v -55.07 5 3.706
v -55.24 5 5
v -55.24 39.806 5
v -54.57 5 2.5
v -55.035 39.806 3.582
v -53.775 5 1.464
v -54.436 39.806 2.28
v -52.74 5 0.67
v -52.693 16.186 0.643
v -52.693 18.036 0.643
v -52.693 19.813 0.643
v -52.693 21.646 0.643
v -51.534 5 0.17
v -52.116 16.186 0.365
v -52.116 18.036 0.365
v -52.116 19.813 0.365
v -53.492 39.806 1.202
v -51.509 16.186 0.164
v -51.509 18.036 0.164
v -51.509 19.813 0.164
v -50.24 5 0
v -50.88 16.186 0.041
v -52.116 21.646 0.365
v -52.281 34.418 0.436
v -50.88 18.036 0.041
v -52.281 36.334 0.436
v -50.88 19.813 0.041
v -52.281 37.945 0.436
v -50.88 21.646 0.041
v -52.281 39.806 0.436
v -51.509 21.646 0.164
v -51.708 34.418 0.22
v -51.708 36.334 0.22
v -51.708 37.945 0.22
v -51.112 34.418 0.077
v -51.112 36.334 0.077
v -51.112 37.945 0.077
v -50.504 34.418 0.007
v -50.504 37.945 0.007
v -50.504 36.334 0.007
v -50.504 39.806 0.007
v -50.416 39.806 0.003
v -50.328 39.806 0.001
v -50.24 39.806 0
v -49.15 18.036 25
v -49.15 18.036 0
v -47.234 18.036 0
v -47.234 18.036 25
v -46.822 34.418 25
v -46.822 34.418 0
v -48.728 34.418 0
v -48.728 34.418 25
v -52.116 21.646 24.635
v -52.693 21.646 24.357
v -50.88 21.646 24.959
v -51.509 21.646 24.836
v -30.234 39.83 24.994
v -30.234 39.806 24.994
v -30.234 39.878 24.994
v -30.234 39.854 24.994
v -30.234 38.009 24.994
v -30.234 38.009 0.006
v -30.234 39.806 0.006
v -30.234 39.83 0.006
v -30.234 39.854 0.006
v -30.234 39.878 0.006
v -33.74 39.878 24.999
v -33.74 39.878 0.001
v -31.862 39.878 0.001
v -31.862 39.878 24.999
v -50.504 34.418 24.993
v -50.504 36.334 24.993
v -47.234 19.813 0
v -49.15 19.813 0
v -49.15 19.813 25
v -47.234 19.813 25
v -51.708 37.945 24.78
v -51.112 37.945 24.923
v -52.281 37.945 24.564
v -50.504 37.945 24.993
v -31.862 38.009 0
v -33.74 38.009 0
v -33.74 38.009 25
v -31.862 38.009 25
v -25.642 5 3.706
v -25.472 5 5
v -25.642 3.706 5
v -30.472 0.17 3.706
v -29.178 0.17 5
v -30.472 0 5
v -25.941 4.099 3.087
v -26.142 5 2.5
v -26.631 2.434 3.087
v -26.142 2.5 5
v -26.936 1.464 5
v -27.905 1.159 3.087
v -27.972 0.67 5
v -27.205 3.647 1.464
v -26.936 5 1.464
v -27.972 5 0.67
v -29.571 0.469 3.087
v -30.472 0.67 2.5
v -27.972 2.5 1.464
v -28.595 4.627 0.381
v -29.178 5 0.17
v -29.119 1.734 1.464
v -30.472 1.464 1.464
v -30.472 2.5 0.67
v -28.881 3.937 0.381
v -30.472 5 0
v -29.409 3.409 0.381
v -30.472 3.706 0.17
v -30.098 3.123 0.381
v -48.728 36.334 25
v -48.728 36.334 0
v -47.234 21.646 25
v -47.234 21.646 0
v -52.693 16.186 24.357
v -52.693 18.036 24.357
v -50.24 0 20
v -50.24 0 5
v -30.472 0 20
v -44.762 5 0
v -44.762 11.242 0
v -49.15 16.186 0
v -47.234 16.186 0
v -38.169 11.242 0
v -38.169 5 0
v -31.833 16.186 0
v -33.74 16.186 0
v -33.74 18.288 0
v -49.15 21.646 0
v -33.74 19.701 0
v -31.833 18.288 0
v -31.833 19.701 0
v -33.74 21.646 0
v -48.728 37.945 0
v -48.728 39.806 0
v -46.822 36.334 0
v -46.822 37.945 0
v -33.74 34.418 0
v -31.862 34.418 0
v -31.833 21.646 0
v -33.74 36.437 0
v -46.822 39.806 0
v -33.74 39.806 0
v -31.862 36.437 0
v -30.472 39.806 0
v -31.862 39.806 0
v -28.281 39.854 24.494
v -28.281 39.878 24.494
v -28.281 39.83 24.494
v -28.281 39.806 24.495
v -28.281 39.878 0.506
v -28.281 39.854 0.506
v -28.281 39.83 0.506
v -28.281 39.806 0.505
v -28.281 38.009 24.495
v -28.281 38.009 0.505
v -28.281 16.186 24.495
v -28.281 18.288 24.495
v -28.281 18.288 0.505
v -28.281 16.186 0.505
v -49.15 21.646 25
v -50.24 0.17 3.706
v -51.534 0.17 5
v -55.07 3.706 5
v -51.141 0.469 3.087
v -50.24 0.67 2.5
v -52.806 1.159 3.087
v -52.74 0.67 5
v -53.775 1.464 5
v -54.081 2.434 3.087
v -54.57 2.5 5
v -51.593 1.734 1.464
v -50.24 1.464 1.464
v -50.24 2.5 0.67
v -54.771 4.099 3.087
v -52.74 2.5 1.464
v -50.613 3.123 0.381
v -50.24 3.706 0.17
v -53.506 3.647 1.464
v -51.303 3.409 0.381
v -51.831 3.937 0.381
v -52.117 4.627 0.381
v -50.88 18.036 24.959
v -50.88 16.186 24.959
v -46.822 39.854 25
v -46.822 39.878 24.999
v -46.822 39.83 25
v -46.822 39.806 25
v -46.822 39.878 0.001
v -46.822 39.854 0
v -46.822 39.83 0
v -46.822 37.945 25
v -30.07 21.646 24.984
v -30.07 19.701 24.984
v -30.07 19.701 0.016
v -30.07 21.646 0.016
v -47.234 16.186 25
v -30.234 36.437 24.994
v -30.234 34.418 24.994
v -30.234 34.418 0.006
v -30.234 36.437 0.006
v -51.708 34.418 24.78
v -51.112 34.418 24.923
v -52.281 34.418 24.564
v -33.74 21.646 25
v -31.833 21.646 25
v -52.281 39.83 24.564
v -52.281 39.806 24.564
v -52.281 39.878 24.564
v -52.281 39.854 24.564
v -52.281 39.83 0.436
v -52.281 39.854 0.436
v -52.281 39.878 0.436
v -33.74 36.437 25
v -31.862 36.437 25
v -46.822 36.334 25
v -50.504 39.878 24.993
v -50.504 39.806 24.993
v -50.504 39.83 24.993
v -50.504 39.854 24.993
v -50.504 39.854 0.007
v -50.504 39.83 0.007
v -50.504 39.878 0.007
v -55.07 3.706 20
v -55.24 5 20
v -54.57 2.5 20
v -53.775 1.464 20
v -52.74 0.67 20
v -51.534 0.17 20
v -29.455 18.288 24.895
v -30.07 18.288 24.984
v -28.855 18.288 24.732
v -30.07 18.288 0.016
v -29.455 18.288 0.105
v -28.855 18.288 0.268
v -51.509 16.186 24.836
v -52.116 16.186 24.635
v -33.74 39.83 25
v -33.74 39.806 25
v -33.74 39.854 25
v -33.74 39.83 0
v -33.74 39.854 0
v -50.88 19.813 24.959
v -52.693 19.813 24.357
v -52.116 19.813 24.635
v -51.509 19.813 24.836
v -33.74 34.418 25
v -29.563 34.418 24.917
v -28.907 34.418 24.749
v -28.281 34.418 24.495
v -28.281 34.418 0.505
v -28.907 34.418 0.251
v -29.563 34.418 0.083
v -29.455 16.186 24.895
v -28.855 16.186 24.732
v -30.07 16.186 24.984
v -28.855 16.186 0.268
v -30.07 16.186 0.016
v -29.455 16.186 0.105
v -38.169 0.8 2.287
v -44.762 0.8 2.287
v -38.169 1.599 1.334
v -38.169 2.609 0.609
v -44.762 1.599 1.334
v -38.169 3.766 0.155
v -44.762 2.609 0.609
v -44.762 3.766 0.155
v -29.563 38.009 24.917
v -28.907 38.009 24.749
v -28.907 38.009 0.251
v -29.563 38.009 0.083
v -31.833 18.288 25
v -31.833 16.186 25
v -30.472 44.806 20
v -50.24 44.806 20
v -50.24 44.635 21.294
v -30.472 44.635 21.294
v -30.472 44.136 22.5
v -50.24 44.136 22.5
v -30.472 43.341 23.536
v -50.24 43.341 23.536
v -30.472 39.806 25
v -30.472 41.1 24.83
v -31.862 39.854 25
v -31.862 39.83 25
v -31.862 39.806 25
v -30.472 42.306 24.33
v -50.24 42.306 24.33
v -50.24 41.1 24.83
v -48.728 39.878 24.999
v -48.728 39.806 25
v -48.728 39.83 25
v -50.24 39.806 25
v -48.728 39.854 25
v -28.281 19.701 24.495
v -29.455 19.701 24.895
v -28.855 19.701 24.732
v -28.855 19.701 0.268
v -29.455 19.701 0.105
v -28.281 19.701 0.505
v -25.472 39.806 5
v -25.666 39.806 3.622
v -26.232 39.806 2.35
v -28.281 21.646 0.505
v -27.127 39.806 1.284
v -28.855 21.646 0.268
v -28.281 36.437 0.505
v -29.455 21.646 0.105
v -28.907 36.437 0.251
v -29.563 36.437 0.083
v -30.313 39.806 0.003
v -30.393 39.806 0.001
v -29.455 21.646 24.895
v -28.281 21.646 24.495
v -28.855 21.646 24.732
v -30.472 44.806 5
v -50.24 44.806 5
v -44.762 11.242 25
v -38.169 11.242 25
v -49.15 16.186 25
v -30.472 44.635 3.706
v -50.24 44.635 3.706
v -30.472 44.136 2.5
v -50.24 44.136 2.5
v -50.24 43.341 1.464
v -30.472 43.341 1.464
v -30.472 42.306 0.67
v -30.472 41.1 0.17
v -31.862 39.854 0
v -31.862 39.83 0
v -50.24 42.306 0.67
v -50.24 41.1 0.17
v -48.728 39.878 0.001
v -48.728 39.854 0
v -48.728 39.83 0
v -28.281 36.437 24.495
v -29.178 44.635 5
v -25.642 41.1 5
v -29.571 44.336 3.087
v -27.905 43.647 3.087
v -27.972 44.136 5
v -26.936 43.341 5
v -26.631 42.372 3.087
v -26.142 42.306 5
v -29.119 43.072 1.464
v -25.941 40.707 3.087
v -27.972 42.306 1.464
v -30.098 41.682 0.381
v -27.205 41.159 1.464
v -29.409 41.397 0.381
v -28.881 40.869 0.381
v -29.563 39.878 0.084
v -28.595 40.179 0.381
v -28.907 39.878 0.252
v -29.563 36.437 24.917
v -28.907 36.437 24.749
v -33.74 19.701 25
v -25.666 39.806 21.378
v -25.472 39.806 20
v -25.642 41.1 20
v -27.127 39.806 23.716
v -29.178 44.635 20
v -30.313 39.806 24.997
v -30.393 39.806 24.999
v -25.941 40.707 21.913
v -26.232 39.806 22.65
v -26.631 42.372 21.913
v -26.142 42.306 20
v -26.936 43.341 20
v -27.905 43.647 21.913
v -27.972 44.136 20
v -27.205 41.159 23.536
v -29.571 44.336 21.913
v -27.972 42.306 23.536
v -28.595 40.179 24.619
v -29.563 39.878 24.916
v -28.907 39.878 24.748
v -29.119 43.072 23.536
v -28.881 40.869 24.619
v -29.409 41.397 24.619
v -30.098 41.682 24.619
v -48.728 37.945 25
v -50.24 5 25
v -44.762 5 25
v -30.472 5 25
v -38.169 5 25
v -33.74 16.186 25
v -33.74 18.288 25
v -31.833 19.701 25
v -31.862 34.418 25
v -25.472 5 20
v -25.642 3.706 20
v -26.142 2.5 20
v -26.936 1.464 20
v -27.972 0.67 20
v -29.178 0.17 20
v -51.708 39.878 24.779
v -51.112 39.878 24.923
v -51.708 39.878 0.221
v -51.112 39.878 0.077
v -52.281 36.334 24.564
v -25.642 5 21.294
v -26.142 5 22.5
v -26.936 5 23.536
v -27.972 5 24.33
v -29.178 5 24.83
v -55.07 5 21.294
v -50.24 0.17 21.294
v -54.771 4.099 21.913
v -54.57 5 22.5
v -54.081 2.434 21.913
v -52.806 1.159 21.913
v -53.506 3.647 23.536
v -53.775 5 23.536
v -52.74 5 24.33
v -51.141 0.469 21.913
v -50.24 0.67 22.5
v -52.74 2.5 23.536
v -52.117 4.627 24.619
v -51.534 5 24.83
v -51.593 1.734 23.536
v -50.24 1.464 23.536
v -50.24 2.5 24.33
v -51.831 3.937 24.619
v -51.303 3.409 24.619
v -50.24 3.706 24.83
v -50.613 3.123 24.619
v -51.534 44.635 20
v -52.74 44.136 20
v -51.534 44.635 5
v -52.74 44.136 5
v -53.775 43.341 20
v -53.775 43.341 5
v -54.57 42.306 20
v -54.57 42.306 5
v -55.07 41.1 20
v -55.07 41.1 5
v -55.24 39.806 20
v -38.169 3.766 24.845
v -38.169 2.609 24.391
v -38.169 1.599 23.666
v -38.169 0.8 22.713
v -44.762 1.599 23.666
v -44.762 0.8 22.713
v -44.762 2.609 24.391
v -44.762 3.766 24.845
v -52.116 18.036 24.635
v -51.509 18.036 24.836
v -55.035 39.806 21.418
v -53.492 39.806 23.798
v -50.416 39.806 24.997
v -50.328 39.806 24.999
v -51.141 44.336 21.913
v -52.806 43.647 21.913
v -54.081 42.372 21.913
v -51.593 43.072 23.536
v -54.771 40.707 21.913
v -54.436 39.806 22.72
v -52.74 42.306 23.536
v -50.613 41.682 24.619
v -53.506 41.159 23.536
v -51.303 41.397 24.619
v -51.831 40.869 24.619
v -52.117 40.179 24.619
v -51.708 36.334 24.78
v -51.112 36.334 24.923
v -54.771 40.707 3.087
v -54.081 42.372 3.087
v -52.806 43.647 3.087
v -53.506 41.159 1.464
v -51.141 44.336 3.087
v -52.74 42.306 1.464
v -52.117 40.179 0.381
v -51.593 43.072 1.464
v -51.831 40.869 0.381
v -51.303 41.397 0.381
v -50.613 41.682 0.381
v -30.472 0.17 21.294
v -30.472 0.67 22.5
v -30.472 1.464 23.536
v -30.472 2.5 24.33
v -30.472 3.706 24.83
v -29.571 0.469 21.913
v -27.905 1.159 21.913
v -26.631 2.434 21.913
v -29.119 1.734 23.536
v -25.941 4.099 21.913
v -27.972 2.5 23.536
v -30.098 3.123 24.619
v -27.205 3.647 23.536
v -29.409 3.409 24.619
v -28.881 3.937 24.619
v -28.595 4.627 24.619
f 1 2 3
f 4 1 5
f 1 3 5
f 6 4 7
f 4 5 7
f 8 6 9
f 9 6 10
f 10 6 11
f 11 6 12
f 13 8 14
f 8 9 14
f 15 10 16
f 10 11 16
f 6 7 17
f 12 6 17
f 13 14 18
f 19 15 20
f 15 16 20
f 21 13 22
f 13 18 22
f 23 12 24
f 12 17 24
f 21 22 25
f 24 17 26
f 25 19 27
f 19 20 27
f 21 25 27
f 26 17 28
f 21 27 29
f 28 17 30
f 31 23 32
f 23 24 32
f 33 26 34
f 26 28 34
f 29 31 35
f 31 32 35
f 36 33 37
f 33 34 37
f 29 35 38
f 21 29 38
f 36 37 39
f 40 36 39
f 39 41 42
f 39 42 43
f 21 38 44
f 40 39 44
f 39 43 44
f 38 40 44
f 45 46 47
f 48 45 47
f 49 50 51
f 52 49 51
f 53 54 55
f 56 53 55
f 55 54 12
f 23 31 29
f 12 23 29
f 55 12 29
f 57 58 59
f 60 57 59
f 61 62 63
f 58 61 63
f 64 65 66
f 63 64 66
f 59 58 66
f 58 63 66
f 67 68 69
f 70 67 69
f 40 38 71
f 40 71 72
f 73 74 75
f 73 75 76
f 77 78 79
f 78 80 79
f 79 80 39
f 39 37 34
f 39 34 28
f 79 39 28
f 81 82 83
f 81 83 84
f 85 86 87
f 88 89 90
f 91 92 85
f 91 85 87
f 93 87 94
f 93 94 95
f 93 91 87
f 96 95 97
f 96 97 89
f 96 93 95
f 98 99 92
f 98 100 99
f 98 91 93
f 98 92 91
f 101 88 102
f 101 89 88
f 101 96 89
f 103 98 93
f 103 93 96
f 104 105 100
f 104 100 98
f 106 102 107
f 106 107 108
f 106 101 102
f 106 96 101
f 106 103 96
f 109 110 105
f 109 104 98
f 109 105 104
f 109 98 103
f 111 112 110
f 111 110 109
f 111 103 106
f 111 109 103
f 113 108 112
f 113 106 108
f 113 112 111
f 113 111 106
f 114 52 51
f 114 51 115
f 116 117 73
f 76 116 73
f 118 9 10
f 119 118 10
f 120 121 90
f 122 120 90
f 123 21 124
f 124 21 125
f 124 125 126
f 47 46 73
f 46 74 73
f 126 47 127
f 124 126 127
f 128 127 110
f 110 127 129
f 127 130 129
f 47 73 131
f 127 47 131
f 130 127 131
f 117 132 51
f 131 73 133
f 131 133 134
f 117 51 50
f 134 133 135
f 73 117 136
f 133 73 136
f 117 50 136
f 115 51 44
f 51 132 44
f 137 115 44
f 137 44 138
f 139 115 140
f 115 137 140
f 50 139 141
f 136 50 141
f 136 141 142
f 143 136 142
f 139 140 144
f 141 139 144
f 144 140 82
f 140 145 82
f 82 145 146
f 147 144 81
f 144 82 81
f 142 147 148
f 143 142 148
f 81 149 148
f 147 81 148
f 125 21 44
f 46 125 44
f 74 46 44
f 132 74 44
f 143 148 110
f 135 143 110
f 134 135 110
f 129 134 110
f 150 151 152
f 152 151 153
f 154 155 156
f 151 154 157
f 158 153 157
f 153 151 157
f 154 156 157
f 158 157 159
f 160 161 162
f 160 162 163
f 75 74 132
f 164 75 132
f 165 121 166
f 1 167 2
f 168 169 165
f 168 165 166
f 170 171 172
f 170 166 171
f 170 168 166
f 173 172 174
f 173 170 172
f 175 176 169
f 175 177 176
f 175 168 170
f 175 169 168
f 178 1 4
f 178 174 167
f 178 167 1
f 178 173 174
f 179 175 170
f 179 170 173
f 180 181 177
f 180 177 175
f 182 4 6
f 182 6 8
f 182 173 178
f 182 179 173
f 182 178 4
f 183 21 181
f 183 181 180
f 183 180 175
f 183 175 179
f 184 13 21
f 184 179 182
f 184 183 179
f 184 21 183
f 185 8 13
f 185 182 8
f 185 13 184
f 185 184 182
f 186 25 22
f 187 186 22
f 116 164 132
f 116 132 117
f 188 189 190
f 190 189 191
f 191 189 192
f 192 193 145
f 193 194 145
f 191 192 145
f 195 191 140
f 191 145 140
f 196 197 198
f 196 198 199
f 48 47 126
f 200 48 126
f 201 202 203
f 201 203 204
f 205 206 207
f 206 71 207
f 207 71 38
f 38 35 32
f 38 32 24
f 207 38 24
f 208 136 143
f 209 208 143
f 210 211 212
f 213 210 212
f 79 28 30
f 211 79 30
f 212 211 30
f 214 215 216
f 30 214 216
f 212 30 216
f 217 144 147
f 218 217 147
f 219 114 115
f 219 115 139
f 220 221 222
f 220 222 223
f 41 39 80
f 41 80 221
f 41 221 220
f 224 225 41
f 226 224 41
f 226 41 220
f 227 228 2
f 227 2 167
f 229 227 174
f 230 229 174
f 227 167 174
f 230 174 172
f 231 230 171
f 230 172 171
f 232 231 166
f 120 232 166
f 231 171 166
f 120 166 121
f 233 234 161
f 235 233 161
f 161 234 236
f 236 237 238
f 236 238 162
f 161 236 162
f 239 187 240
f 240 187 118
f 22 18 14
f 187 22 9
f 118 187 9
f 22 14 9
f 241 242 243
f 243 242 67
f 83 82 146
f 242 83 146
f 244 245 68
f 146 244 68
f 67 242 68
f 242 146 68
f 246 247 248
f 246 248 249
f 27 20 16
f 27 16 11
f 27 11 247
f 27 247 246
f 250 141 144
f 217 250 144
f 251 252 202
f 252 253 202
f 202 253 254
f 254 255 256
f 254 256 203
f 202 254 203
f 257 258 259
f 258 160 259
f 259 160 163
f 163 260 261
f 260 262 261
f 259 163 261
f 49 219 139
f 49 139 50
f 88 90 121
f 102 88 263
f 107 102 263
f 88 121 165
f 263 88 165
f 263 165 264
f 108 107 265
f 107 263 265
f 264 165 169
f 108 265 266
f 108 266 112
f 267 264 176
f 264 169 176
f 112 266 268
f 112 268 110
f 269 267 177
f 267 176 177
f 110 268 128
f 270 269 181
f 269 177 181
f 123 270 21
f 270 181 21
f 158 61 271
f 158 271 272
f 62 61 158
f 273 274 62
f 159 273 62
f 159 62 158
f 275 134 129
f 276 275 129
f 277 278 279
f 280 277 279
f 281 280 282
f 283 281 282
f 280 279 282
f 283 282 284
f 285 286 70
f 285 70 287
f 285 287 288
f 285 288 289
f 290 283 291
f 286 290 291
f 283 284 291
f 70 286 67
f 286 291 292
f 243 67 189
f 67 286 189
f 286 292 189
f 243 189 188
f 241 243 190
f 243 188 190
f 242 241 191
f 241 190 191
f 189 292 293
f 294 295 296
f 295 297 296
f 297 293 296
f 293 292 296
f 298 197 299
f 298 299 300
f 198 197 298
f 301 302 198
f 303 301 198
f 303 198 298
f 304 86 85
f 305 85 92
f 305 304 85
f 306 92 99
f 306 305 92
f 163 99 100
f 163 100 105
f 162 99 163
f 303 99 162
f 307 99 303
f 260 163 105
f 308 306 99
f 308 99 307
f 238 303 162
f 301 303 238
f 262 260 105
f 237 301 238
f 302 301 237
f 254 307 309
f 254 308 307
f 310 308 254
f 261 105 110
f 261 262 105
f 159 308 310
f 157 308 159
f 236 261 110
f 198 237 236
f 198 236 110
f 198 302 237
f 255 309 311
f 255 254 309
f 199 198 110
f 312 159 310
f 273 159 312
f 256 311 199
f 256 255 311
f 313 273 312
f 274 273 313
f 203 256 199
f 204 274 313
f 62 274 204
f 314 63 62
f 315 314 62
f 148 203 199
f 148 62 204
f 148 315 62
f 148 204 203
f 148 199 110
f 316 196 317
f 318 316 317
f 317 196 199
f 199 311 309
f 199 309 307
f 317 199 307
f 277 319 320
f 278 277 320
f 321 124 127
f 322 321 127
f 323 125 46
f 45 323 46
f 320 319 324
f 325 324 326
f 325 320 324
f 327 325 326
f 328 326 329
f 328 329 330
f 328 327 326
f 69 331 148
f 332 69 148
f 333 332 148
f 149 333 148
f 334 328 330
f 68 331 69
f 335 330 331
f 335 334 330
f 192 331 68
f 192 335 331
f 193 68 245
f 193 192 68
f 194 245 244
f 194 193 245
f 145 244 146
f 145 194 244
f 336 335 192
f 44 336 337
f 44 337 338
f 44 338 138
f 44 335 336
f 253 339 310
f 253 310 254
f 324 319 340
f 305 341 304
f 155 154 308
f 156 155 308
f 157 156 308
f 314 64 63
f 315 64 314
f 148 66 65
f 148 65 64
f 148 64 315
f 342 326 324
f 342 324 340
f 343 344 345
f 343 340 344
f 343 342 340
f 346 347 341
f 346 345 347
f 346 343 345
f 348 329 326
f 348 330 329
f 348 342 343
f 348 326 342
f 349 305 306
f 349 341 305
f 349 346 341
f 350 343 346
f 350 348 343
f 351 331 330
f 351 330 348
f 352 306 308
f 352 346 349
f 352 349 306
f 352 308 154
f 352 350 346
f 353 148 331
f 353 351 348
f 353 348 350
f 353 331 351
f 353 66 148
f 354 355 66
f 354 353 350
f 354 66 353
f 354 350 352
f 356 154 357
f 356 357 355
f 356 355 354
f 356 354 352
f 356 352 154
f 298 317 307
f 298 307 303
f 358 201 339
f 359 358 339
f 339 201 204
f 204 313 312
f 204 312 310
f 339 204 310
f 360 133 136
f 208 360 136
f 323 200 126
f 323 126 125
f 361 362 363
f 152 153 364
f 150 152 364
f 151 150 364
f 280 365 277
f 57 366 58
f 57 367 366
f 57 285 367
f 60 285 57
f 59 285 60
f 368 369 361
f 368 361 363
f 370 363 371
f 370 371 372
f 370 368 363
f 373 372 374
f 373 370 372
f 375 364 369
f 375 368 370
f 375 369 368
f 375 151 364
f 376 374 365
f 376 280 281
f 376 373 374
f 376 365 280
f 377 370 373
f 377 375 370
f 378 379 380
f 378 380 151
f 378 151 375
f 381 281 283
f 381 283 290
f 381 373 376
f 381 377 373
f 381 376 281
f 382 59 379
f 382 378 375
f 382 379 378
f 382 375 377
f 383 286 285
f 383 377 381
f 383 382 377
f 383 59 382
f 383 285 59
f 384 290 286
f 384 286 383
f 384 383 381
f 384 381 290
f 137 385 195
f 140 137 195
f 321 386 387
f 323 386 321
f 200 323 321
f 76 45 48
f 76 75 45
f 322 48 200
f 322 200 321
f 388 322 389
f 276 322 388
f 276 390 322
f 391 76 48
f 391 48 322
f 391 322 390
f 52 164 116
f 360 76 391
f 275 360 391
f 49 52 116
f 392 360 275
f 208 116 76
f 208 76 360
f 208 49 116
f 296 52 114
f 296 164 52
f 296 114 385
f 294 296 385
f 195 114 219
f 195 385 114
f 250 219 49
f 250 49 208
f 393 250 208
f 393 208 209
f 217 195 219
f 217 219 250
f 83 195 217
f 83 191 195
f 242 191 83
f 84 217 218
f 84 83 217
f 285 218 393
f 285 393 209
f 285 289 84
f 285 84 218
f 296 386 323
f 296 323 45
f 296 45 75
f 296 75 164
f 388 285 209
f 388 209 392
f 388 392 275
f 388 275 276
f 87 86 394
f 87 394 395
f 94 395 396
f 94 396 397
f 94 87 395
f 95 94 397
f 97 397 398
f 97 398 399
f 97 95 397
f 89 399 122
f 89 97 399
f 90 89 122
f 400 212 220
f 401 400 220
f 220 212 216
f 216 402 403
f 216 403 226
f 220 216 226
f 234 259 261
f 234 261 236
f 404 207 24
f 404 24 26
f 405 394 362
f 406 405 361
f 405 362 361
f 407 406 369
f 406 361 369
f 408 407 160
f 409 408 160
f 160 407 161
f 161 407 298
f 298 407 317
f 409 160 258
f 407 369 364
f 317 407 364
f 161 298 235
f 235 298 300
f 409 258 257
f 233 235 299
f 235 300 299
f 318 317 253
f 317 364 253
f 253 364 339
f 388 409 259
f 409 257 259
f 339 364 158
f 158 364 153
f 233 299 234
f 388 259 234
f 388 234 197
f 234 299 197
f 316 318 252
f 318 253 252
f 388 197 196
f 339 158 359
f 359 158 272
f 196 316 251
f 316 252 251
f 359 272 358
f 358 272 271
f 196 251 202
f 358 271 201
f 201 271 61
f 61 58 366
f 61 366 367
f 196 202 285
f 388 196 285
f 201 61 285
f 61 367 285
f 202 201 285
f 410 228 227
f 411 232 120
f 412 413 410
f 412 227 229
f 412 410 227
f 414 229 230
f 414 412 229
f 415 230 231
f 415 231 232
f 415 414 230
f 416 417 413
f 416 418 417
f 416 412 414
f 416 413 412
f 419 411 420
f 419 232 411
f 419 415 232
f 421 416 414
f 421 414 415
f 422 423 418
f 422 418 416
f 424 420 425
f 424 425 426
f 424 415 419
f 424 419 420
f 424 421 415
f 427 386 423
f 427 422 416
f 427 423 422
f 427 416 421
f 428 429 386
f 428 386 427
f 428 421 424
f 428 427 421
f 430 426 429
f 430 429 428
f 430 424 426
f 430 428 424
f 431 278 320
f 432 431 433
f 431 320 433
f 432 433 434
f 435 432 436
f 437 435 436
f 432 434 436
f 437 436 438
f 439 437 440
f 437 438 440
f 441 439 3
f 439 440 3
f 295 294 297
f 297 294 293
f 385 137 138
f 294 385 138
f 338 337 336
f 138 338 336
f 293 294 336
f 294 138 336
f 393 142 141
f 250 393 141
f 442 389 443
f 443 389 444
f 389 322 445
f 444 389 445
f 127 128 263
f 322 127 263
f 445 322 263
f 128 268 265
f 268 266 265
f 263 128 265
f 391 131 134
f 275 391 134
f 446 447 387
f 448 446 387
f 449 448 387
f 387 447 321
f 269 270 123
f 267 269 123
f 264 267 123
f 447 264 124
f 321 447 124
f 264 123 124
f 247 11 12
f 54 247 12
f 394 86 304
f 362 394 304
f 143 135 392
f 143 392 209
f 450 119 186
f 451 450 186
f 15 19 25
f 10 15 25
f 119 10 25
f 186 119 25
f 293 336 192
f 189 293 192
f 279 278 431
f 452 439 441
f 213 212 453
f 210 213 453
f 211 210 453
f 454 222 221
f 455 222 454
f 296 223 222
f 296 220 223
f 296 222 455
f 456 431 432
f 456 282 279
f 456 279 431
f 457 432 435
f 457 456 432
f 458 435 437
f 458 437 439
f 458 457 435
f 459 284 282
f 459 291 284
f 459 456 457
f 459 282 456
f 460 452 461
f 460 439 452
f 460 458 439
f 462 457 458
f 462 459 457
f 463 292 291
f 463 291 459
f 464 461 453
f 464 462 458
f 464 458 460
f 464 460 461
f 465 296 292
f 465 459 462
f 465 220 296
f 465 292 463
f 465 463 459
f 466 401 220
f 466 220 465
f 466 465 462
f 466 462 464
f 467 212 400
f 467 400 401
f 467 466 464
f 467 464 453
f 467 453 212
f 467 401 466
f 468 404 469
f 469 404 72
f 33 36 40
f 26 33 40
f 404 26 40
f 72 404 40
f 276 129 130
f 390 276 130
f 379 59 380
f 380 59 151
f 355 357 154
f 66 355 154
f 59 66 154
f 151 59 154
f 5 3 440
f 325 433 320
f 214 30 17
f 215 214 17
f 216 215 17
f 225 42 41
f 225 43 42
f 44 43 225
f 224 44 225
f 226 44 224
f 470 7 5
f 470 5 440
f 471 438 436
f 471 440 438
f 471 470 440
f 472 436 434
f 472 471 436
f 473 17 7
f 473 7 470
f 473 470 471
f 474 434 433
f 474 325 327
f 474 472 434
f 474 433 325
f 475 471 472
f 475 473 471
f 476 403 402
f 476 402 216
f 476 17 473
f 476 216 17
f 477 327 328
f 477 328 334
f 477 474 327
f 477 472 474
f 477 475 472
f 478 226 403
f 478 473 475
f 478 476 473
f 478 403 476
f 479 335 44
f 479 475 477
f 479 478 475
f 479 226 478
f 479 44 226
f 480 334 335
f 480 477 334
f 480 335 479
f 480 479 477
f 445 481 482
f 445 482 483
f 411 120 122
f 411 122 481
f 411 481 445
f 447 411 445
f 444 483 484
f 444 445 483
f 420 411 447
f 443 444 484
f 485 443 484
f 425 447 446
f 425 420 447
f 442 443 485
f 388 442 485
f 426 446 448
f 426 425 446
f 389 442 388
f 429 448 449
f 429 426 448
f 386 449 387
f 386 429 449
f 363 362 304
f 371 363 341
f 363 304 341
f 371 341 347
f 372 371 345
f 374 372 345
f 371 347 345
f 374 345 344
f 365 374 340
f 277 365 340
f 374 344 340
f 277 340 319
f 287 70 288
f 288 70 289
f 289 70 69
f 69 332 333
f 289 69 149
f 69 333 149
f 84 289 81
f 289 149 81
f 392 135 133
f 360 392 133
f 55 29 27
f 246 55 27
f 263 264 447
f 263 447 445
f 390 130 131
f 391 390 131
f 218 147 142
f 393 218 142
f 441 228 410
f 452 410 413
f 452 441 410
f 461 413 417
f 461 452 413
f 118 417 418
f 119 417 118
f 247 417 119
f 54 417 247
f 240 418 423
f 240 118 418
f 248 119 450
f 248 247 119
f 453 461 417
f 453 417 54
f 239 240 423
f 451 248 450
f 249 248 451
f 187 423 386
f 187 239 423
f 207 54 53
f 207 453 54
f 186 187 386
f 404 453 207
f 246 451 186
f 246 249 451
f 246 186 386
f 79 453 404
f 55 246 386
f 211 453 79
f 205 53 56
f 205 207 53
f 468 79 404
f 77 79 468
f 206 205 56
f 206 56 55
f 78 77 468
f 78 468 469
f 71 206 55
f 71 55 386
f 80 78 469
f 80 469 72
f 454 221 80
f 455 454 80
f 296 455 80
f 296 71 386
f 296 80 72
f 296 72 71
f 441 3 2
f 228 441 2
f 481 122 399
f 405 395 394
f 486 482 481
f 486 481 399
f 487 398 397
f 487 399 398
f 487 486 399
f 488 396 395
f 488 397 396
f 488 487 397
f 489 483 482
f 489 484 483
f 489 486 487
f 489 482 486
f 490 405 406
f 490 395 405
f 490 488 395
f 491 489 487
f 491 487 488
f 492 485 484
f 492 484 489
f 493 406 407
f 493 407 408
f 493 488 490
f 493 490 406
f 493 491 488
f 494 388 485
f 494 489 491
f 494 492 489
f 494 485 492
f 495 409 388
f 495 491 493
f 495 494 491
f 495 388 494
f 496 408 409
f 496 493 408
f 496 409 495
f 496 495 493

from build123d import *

# Parameters (mm, degrees)
F0_W         = 6.5923197919
F0_H         = 0.8001455572
F0_W_2       = 1.763837412
F0_H_2       = 1.412447542
F0_H_3       = 2.101770214
F0_W_3       = 1.9069323985
F0_H_4       = 1.9450464989
F0_W_4       = 1.7884944444
F0_W_5       = 1.6274210066
F0_H_5       = 1.5719905496
F0_H_6       = 1.8685259757
F0_W_6       = 1.9532360649
F0_H_7       = 2.0187458968
F0_W_7       = 1.8786090163
F0_W_8       = 1.7776318862
F0_H_8       = 1.6108304262
F0_W_9       = 1.7758645117
F0_H_9       = 1.9326903758
F0_H_10      = 1.91574162
F0_W_10      = 1.905767857
F0_W_11      = 1.7302669585
F0_H_11      = 1.8497077592
F0_H_12      = 1.7764922231
F0_H_13      = 1.8330642725
F0_W_12      = 1.8128681632
F0_W_13      = 1.9161291332
F1_DEPTH     = 25
F2_T1_DEPTH  = 34.8057161443
F2_T3_DEPTH  = 15
F2_T5_DEPTH  = 19.7681800186
F2_S9_W      = 5
F2_S9_H      = 5
F2_T10_DEPTH = 5
F2_S15_W     = 5
F2_S15_H     = 5
F2_T16_DEPTH = 5
F2_S21_W     = 5
F2_S21_H     = 5
F2_T22_DEPTH = 5
F2_S27_W     = 5
F2_S27_H     = 5
F2_T28_DEPTH = 5
F2_S33_W     = 5
F2_S33_H     = 5
F2_T34_DEPTH = 5
F2_S39_W     = 5
F2_S39_H     = 5
F2_T40_DEPTH = 5
F2_S45_W     = 5
F2_S45_H     = 5
F2_T46_DEPTH = 5
F2_S51_W     = 5
F2_S51_H     = 5
F2_T52_DEPTH = 5


# Not quite as in the source:
# - a fillet or chamfer that OpenCascade refuses, or shapes differently, is made with other operations: its cross-section is extruded or revolved along the edge and cut away or added


with BuildPart() as f1:
    # F0 (on Top) → F1 (new body)
    with BuildSketch(Plane.XY):
        with Locations((-41.465645377, 0.4000727786)):
            Rectangle(F0_W, F0_H)
        Polygon((-25.4717437439, 44.8057161443), (-55.2399237625, 44.8057161443), (-55.2399237625, 0), (-44.761805273, 0), (-44.761805273, 0.8001455572), (-44.761805273, 11.2422176864), (-38.1694854811, 11.2422176864), (-38.1694854811, 0.8001455572), (-38.1694854811, 0), (-25.4717437439, 0), (-25.4717437439, 44.1919353443), align=None)
        Polygon((-52.6931885334, 19.8126584291), (-52.6931885334, 21.6457227017), (-50.8803203702, 21.6457227017), (-49.1500534117, 21.6457227017), (-47.2339242785, 21.6457227017), (-47.2339242785, 19.8126584291), (-47.2339242785, 18.036166206), (-47.2339242785, 16.1864584468), (-49.1500534117, 16.1864584468), (-50.8803203702, 16.1864584468), (-52.6931885334, 16.1864584468), (-52.6931885334, 18.036166206), align=None, mode=Mode.SUBTRACT)
        Polygon((-30.0695020705, 21.6457227017), (-28.2810076261, 21.6457227017), (-28.2810076261, 19.7006762028), (-28.2810076261, 18.2882286608), (-28.2810076261, 16.1864584468), (-30.0695020705, 16.1864584468), (-31.8333394825, 16.1864584468), (-33.740271881, 16.1864584468), (-33.740271881, 18.2882286608), (-33.740271881, 19.7006762028), (-33.740271881, 21.6457227017), (-31.8333394825, 21.6457227017), align=None, mode=Mode.SUBTRACT)
        Polygon((-52.2811726703, 37.9449166358), (-52.2811726703, 39.8776070116), (-50.5035407841, 39.8776070116), (-48.7276762724, 39.8776070116), (-46.8219084154, 39.8776070116), (-46.8219084154, 37.9449166358), (-46.8219084154, 36.3340862095), (-46.8219084154, 34.4183445895), (-48.7276762724, 34.4183445895), (-50.5035407841, 34.4183445895), (-52.2811726703, 34.4183445895), (-52.2811726703, 36.3340862095), align=None, mode=Mode.SUBTRACT)
        Polygon((-30.2342418581, 39.8776070116), (-28.2810057933, 39.8776070116), (-28.2810057933, 38.0090810359), (-28.2810057933, 36.4370904863), (-28.2810057933, 34.4183445895), (-30.2342418581, 34.4183445895), (-31.8616628647, 34.4183445895), (-33.740271881, 34.4183445895), (-33.740271881, 36.4370904863), (-33.740271881, 38.0090810359), (-33.740271881, 39.8776070116), (-31.8616628647, 39.8776070116), align=None, mode=Mode.SUBTRACT)
        with Locations((-30.9514207765, 18.9944524318)):
            Rectangle(F0_W_2, F0_H_2)
        with Locations((-30.9514207765, 17.2373435538)):
            Rectangle(F0_W_2, F0_H_3)
        with Locations((-32.7868056818, 18.9944524318)):
            Rectangle(F0_W_3, F0_H_2)
        with Locations((-30.9514207765, 20.6731994522)):
            Rectangle(F0_W_2, F0_H_4)
        with Locations((-29.1752548483, 18.9944524318)):
            Rectangle(F0_W_4, F0_H_2)
        with Locations((-31.0479523614, 37.2230857611)):
            Rectangle(F0_W_5, F0_H_5)
        with Locations((-31.0479523614, 38.9433440237)):
            Rectangle(F0_W_5, F0_H_6)
        with Locations((-29.2576238257, 37.2230857611)):
            Rectangle(F0_W_6, F0_H_5)
        with Locations((-31.0479523614, 35.4277175379)):
            Rectangle(F0_W_5, F0_H_7)
        with Locations((-32.8009673728, 37.2230857611)):
            Rectangle(F0_W_7, F0_H_5)
        with Locations((-51.3923567272, 37.1395014226)):
            Rectangle(F0_W_8, F0_H_8)
        with Locations((-49.6156085283, 37.1395014226)):
            Rectangle(F0_W_9, F0_H_8)
        with Locations((-49.6156085283, 38.9112618237)):
            Rectangle(F0_W_9, F0_H_9)
        with Locations((-49.6156085283, 35.3762153995)):
            Rectangle(F0_W_9, F0_H_10)
        with Locations((-47.7747923439, 37.1395014226)):
            Rectangle(F0_W_10, F0_H_8)
        with Locations((-50.015186891, 17.1113123264)):
            Rectangle(F0_W_11, F0_H_11)
        with Locations((-50.015186891, 18.9244123176)):
            Rectangle(F0_W_11, F0_H_12)
        with Locations((-50.015186891, 20.7291905654)):
            Rectangle(F0_W_11, F0_H_13)
        with Locations((-51.7867544518, 18.9244123176)):
            Rectangle(F0_W_12, F0_H_12)
        with Locations((-48.1919888451, 18.9244123176)):
            Rectangle(F0_W_13, F0_H_12)
    extrude(amount=F1_DEPTH)

    # F2: fillet of radius 5 on 12 edges, made by hand

    # F2_s2 → F2_t1 (cut)
    with BuildSketch(Plane.XZ.offset(-39.8057161443)):
        with BuildLine():
            ThreePointArc((-25.4717437439, 5), (-26.9362098379, 1.4644660941), (-30.4717437439, 0))
            Line((-30.4717437439, 0), (-25.4717437439, 0))
            Line((-25.4717437439, 0), (-25.4717437439, 5))
        make_face()
        with BuildLine():
            ThreePointArc((-25.4717437439, 20), (-26.9362098379, 23.5355339059), (-30.4717437439, 25))
            Line((-30.4717437439, 25), (-25.4717437439, 25))
            Line((-25.4717437439, 25), (-25.4717437439, 20))
        make_face()
        with BuildLine():
            ThreePointArc((-55.2399237625, 5), (-53.7754576684, 1.4644660941), (-50.2399237625, 0))
            Line((-50.2399237625, 0), (-55.2399237625, 0))
            Line((-55.2399237625, 0), (-55.2399237625, 5))
        make_face()
        with BuildLine():
            ThreePointArc((-55.2399237625, 20), (-53.7754576684, 23.5355339059), (-50.2399237625, 25))
            Line((-50.2399237625, 25), (-55.2399237625, 25))
            Line((-55.2399237625, 25), (-55.2399237625, 20))
        make_face()
    extrude(amount=F2_T1_DEPTH, mode=Mode.SUBTRACT)

    # F2_s4 → F2_t3 (cut)
    with BuildSketch(Plane.XY.offset(5)):
        with BuildLine():
            ThreePointArc((-25.4717437439, 39.8057161443), (-26.9362098379, 43.3412500502), (-30.4717437439, 44.8057161443))
            Line((-30.4717437439, 44.8057161443), (-25.4717437439, 44.8057161443))
            Line((-25.4717437439, 44.8057161443), (-25.4717437439, 39.8057161443))
        make_face()
        with BuildLine():
            ThreePointArc((-50.2399237625, 44.8057161443), (-53.7754576684, 43.3412500502), (-55.2399237625, 39.8057161443))
            Line((-55.2399237625, 39.8057161443), (-55.2399237625, 44.8057161443))
            Line((-55.2399237625, 44.8057161443), (-50.2399237625, 44.8057161443))
        make_face()
        with BuildLine():
            ThreePointArc((-55.2399237625, 5), (-53.7754576684, 1.4644660941), (-50.2399237625, 0))
            Line((-50.2399237625, 0), (-55.2399237625, 0))
            Line((-55.2399237625, 0), (-55.2399237625, 5))
        make_face()
        with BuildLine():
            ThreePointArc((-25.4717437439, 5), (-26.9362098379, 1.4644660941), (-30.4717437439, 0))
            Line((-30.4717437439, 0), (-25.4717437439, 0))
            Line((-25.4717437439, 0), (-25.4717437439, 5))
        make_face()
    extrude(amount=F2_T3_DEPTH, mode=Mode.SUBTRACT)

    # F2_s6 → F2_t5 (cut)
    with BuildSketch(Plane.YZ.offset(-50.2399237625)):
        with BuildLine():
            ThreePointArc((44.8057161443, 5), (43.3412500502, 1.4644660941), (39.8057161443, 0))
            Line((39.8057161443, 0), (44.8057161443, 0))
            Line((44.8057161443, 0), (44.8057161443, 5))
        make_face()
        with BuildLine():
            ThreePointArc((44.8057161443, 20), (43.3412500502, 23.5355339059), (39.8057161443, 25))
            Line((39.8057161443, 25), (44.8057161443, 25))
            Line((44.8057161443, 25), (44.8057161443, 20))
        make_face()
        with BuildLine():
            ThreePointArc((0, 20), (1.4644660941, 23.5355339059), (5, 25))
            Line((5, 25), (0, 25))
            Line((0, 25), (0, 20))
        make_face()
        with BuildLine():
            ThreePointArc((0, 5), (1.4644660941, 1.4644660941), (5, 0))
            Line((5, 0), (0, 0))
            Line((0, 0), (0, 5))
        make_face()
    extrude(amount=F2_T5_DEPTH, mode=Mode.SUBTRACT)


with BuildPart() as f2_tool8:
    # F2_s9 → F2_t10 (new body)
    with BuildSketch(Plane.XY.offset(5)):
        with Locations((-27.9717437439, 2.5)):
            Rectangle(F2_S9_W, F2_S9_H)
    extrude(amount=-F2_T10_DEPTH)

    # F2_s11 → F2_t12 (revolve, cut)
    with BuildSketch(Plane(origin=(-30.4717437439, 5, 5), x_dir=(-0.7071067812, 0.7071067812, 0), z_dir=(-0.7071067812, -0.7071067812, 0))):
        with BuildLine():
            ThreePointArc((0, -5), (5, 0), (0, 5))
            Line((0, 5), (0, -5))
        make_face()
    revolve(axis=Axis((-30.4717437439, 5, 5), (0, 0, -1)), mode=Mode.SUBTRACT)


with BuildPart() as f1_1:
    add(f1.part)

    # F2_t7: cut F2_tool8
    add(f2_tool8.part, mode=Mode.SUBTRACT)


with BuildPart() as f2_tool14:
    # F2_s15 → F2_t16 (new body)
    with BuildSketch(Plane.XY.offset(5)):
        with Locations((-27.9717437439, 42.3057161443)):
            Rectangle(F2_S15_W, F2_S15_H)
    extrude(amount=-F2_T16_DEPTH)

    # F2_s17 → F2_t18 (revolve, cut)
    with BuildSketch(Plane(origin=(-30.4717437439, 39.8057161443, 5), x_dir=(-0.7071067812, -0.7071067812, 0), z_dir=(0.7071067812, -0.7071067812, 0))):
        with BuildLine():
            ThreePointArc((0, -5), (5, 0), (0, 5))
            Line((0, 5), (0, -5))
        make_face()
    revolve(axis=Axis((-30.4717437439, 39.8057161443, 5), (0, 0, -1)), mode=Mode.SUBTRACT)


with BuildPart() as f1_2:
    add(f1_1.part)

    # F2_t13: cut F2_tool14
    add(f2_tool14.part, mode=Mode.SUBTRACT)


with BuildPart() as f2_tool20:
    # F2_s21 → F2_t22 (new body)
    with BuildSketch(Plane.XY.offset(20)):
        with Locations((-27.9717437439, 42.3057161443)):
            Rectangle(F2_S21_W, F2_S21_H)
    extrude(amount=F2_T22_DEPTH)

    # F2_s23 → F2_t24 (revolve, cut)
    with BuildSketch(Plane(origin=(-30.4717437439, 39.8057161443, 20), x_dir=(-0.7071067812, -0.7071067812, 0), z_dir=(-0.7071067812, 0.7071067812, 0))):
        with BuildLine():
            ThreePointArc((0, -5), (5, 0), (0, 5))
            Line((0, 5), (0, -5))
        make_face()
    revolve(axis=Axis((-30.4717437439, 39.8057161443, 20), (0, 0, 1)), mode=Mode.SUBTRACT)


with BuildPart() as f1_3:
    add(f1_2.part)

    # F2_t19: cut F2_tool20
    add(f2_tool20.part, mode=Mode.SUBTRACT)


with BuildPart() as f2_tool26:
    # F2_s27 → F2_t28 (new body)
    with BuildSketch(Plane.XY.offset(20)):
        with Locations((-27.9717437439, 2.5)):
            Rectangle(F2_S27_W, F2_S27_H)
    extrude(amount=F2_T28_DEPTH)

    # F2_s29 → F2_t30 (revolve, cut)
    with BuildSketch(Plane(origin=(-30.4717437439, 5, 20), x_dir=(-0.7071067812, 0.7071067812, 0), z_dir=(0.7071067812, 0.7071067812, 0))):
        with BuildLine():
            ThreePointArc((0, -5), (5, 0), (0, 5))
            Line((0, 5), (0, -5))
        make_face()
    revolve(axis=Axis((-30.4717437439, 5, 20), (0, 0, 1)), mode=Mode.SUBTRACT)


with BuildPart() as f1_4:
    add(f1_3.part)

    # F2_t25: cut F2_tool26
    add(f2_tool26.part, mode=Mode.SUBTRACT)


with BuildPart() as f2_tool32:
    # F2_s33 → F2_t34 (new body)
    with BuildSketch(Plane.XY.offset(5)):
        with Locations((-52.7399237625, 42.3057161443)):
            Rectangle(F2_S33_W, F2_S33_H)
    extrude(amount=-F2_T34_DEPTH)

    # F2_s35 → F2_t36 (revolve, cut)
    with BuildSketch(Plane(origin=(-50.2399237625, 39.8057161443, 5), x_dir=(0.7071067812, -0.7071067812, 0), z_dir=(0.7071067812, 0.7071067812, 0))):
        with BuildLine():
            ThreePointArc((0, -5), (5, 0), (0, 5))
            Line((0, 5), (0, -5))
        make_face()
    revolve(axis=Axis((-50.2399237625, 39.8057161443, 5), (0, 0, -1)), mode=Mode.SUBTRACT)


with BuildPart() as f1_5:
    add(f1_4.part)

    # F2_t31: cut F2_tool32
    add(f2_tool32.part, mode=Mode.SUBTRACT)


with BuildPart() as f2_tool38:
    # F2_s39 → F2_t40 (new body)
    with BuildSketch(Plane.XY.offset(5)):
        with Locations((-52.7399237625, 2.5)):
            Rectangle(F2_S39_W, F2_S39_H)
    extrude(amount=-F2_T40_DEPTH)

    # F2_s41 → F2_t42 (revolve, cut)
    with BuildSketch(Plane(origin=(-50.2399237625, 5, 5), x_dir=(0.7071067812, 0.7071067812, 0), z_dir=(-0.7071067812, 0.7071067812, 0))):
        with BuildLine():
            ThreePointArc((0, -5), (5, 0), (0, 5))
            Line((0, 5), (0, -5))
        make_face()
    revolve(axis=Axis((-50.2399237625, 5, 5), (0, 0, -1)), mode=Mode.SUBTRACT)


with BuildPart() as f1_6:
    add(f1_5.part)

    # F2_t37: cut F2_tool38
    add(f2_tool38.part, mode=Mode.SUBTRACT)


with BuildPart() as f2_tool44:
    # F2_s45 → F2_t46 (new body)
    with BuildSketch(Plane.XY.offset(20)):
        with Locations((-52.7399237625, 42.3057161443)):
            Rectangle(F2_S45_W, F2_S45_H)
    extrude(amount=F2_T46_DEPTH)

    # F2_s47 → F2_t48 (revolve, cut)
    with BuildSketch(Plane(origin=(-50.2399237625, 39.8057161443, 20), x_dir=(0.7071067812, -0.7071067812, 0), z_dir=(-0.7071067812, -0.7071067812, 0))):
        with BuildLine():
            ThreePointArc((0, -5), (5, 0), (0, 5))
            Line((0, 5), (0, -5))
        make_face()
    revolve(axis=Axis((-50.2399237625, 39.8057161443, 20), (0, 0, 1)), mode=Mode.SUBTRACT)


with BuildPart() as f1_7:
    add(f1_6.part)

    # F2_t43: cut F2_tool44
    add(f2_tool44.part, mode=Mode.SUBTRACT)


with BuildPart() as f2_tool50:
    # F2_s51 → F2_t52 (new body)
    with BuildSketch(Plane.XY.offset(20)):
        with Locations((-52.7399237625, 2.5)):
            Rectangle(F2_S51_W, F2_S51_H)
    extrude(amount=F2_T52_DEPTH)

    # F2_s53 → F2_t54 (revolve, cut)
    with BuildSketch(Plane(origin=(-50.2399237625, 5, 20), x_dir=(0.7071067812, 0.7071067812, 0), z_dir=(0.7071067812, -0.7071067812, 0))):
        with BuildLine():
            ThreePointArc((0, -5), (5, 0), (0, 5))
            Line((0, 5), (0, -5))
        make_face()
    revolve(axis=Axis((-50.2399237625, 5, 20), (0, 0, 1)), mode=Mode.SUBTRACT)


with BuildPart() as f1_8:
    add(f1_7.part)

    # F2_t49: cut F2_tool50
    add(f2_tool50.part, mode=Mode.SUBTRACT)


solid = f1_8.part
